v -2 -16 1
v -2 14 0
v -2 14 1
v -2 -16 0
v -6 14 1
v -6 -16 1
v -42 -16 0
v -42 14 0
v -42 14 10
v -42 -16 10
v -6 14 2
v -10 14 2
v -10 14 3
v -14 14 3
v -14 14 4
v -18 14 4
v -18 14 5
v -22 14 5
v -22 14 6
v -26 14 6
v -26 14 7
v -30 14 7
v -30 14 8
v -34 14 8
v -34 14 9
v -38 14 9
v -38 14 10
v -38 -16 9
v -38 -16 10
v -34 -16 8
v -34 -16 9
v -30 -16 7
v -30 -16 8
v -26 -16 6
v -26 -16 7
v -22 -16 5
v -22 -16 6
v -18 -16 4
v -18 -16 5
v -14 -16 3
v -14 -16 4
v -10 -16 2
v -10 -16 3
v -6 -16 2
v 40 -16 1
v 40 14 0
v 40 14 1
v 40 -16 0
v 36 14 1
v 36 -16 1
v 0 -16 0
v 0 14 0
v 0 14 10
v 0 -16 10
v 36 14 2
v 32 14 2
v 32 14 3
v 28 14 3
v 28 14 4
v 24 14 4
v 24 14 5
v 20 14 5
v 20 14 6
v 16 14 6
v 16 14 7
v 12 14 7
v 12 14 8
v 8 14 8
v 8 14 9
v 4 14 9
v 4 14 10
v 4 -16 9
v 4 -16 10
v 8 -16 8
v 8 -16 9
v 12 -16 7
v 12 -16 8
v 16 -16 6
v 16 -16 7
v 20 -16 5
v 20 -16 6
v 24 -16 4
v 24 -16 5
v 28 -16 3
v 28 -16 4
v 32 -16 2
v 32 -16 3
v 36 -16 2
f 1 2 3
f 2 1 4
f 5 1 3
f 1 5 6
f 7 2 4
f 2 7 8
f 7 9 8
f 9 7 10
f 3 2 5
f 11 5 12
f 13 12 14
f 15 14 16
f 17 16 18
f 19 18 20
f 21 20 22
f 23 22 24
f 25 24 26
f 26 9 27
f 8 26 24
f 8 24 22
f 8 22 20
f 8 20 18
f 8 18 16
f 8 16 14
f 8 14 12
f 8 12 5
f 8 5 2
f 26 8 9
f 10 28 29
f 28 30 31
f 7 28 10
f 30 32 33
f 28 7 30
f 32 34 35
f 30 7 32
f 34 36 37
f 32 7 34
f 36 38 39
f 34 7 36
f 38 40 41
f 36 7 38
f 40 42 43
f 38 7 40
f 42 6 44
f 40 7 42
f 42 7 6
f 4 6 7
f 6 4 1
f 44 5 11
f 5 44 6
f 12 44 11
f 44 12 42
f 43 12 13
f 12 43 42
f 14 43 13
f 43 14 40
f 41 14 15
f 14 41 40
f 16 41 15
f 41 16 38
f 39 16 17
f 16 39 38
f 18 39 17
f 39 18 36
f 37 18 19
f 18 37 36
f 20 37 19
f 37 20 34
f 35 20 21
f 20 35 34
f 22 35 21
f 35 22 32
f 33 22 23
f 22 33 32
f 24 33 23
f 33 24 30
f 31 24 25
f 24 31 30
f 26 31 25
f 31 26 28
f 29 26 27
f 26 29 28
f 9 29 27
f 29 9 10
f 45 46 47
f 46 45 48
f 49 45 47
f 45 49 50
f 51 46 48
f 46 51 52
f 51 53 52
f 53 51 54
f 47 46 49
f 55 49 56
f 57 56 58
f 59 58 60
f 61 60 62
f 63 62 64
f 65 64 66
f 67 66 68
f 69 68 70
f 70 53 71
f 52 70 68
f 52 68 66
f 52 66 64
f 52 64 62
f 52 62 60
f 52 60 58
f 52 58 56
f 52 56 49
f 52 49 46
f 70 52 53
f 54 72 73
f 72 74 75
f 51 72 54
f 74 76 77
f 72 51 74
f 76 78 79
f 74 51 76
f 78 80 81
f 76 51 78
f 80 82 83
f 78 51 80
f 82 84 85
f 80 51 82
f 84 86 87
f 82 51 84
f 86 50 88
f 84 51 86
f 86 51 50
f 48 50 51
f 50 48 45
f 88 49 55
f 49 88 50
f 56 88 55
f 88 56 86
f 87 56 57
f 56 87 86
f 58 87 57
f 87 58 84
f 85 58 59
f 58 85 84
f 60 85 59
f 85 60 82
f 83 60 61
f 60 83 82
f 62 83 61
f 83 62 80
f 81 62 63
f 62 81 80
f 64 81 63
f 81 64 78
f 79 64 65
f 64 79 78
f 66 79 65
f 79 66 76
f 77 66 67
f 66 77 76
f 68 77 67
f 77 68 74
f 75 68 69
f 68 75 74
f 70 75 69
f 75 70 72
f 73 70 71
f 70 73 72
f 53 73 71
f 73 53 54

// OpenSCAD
//
//  Toilet_shim
//
//  EvilTeach 11/2015
//
//  This model generates a shim suitable for adjusting your toilet.
//  It is basically a series of smaller and smaller rectangles.
//  As it is parameterized, you can generate it however you want.
//
//  It also lets you print multiple copies.   By default it prints two.
//
//  This is post-card-ware.  Let me know in a comment how this worked out
//  for you.  Defect reports, and suggestions for improvements are always welcome.
//
//  I recommend you use ABS with at least a 50% fill.
//  Anything lower that 4 as a stepDepth doesn't work as well.
//  Your toilet bottom edge will vary, so it may take a print or two
//  to zero in on your desired depth.
//


shimsPerRow  =  1;        // How many shims to fit on print on the X axis
rowsPerPrint =  2;        // How many rows of shims to print on the Y axis

shimLength   = 40;        // Total Length of the shim
shimWidth    = 30;        // Total Width of the shim

stepDepth    =  4;        // The depth of one step of the shim
stepHeight   =  1;        // The height of one step of the shim
stepWidth    = shimWidth; // The width of one step of the shim


//
//  This function draws exactly one layers of the shim
//
module draw_one_layer(length)
{
    translate([0, 0, (shimLength - length) / stepDepth * stepHeight])
        cube([length, stepWidth, stepHeight]);
}


//
//  This function draws exactly one shim
//  at the given offset
//
module draw_one_shim(xOffset, yOffset)
{
    gapBetweenShims = 2;
    
    translate([yOffset * (shimLength + gapBetweenShims), 
               xOffset * (shimWidth  + gapBetweenShims), 
               0])
        for (length=[shimLength : -stepDepth : stepDepth])
        {
            draw_one_layer(length);
        }
}

//
//  This function iterate over the desired number of shims per row
//  and shims per column, drawing each shim as it goes.
//  The loops are designed to try to keep things centered on the build plate
//
module main()
{
    for (yOffset = [-rowsPerPrint / 2 : 1 : rowsPerPrint / 2 - 1])
    {
        for (xOffset =[-shimsPerRow / 2 : 1 : shimsPerRow / 2 - 1])
        {
            draw_one_shim(xOffset, yOffset);
        }
    }
}

// Welcome to the entry point. 
// Can you tell I am a C programmer?
main();
